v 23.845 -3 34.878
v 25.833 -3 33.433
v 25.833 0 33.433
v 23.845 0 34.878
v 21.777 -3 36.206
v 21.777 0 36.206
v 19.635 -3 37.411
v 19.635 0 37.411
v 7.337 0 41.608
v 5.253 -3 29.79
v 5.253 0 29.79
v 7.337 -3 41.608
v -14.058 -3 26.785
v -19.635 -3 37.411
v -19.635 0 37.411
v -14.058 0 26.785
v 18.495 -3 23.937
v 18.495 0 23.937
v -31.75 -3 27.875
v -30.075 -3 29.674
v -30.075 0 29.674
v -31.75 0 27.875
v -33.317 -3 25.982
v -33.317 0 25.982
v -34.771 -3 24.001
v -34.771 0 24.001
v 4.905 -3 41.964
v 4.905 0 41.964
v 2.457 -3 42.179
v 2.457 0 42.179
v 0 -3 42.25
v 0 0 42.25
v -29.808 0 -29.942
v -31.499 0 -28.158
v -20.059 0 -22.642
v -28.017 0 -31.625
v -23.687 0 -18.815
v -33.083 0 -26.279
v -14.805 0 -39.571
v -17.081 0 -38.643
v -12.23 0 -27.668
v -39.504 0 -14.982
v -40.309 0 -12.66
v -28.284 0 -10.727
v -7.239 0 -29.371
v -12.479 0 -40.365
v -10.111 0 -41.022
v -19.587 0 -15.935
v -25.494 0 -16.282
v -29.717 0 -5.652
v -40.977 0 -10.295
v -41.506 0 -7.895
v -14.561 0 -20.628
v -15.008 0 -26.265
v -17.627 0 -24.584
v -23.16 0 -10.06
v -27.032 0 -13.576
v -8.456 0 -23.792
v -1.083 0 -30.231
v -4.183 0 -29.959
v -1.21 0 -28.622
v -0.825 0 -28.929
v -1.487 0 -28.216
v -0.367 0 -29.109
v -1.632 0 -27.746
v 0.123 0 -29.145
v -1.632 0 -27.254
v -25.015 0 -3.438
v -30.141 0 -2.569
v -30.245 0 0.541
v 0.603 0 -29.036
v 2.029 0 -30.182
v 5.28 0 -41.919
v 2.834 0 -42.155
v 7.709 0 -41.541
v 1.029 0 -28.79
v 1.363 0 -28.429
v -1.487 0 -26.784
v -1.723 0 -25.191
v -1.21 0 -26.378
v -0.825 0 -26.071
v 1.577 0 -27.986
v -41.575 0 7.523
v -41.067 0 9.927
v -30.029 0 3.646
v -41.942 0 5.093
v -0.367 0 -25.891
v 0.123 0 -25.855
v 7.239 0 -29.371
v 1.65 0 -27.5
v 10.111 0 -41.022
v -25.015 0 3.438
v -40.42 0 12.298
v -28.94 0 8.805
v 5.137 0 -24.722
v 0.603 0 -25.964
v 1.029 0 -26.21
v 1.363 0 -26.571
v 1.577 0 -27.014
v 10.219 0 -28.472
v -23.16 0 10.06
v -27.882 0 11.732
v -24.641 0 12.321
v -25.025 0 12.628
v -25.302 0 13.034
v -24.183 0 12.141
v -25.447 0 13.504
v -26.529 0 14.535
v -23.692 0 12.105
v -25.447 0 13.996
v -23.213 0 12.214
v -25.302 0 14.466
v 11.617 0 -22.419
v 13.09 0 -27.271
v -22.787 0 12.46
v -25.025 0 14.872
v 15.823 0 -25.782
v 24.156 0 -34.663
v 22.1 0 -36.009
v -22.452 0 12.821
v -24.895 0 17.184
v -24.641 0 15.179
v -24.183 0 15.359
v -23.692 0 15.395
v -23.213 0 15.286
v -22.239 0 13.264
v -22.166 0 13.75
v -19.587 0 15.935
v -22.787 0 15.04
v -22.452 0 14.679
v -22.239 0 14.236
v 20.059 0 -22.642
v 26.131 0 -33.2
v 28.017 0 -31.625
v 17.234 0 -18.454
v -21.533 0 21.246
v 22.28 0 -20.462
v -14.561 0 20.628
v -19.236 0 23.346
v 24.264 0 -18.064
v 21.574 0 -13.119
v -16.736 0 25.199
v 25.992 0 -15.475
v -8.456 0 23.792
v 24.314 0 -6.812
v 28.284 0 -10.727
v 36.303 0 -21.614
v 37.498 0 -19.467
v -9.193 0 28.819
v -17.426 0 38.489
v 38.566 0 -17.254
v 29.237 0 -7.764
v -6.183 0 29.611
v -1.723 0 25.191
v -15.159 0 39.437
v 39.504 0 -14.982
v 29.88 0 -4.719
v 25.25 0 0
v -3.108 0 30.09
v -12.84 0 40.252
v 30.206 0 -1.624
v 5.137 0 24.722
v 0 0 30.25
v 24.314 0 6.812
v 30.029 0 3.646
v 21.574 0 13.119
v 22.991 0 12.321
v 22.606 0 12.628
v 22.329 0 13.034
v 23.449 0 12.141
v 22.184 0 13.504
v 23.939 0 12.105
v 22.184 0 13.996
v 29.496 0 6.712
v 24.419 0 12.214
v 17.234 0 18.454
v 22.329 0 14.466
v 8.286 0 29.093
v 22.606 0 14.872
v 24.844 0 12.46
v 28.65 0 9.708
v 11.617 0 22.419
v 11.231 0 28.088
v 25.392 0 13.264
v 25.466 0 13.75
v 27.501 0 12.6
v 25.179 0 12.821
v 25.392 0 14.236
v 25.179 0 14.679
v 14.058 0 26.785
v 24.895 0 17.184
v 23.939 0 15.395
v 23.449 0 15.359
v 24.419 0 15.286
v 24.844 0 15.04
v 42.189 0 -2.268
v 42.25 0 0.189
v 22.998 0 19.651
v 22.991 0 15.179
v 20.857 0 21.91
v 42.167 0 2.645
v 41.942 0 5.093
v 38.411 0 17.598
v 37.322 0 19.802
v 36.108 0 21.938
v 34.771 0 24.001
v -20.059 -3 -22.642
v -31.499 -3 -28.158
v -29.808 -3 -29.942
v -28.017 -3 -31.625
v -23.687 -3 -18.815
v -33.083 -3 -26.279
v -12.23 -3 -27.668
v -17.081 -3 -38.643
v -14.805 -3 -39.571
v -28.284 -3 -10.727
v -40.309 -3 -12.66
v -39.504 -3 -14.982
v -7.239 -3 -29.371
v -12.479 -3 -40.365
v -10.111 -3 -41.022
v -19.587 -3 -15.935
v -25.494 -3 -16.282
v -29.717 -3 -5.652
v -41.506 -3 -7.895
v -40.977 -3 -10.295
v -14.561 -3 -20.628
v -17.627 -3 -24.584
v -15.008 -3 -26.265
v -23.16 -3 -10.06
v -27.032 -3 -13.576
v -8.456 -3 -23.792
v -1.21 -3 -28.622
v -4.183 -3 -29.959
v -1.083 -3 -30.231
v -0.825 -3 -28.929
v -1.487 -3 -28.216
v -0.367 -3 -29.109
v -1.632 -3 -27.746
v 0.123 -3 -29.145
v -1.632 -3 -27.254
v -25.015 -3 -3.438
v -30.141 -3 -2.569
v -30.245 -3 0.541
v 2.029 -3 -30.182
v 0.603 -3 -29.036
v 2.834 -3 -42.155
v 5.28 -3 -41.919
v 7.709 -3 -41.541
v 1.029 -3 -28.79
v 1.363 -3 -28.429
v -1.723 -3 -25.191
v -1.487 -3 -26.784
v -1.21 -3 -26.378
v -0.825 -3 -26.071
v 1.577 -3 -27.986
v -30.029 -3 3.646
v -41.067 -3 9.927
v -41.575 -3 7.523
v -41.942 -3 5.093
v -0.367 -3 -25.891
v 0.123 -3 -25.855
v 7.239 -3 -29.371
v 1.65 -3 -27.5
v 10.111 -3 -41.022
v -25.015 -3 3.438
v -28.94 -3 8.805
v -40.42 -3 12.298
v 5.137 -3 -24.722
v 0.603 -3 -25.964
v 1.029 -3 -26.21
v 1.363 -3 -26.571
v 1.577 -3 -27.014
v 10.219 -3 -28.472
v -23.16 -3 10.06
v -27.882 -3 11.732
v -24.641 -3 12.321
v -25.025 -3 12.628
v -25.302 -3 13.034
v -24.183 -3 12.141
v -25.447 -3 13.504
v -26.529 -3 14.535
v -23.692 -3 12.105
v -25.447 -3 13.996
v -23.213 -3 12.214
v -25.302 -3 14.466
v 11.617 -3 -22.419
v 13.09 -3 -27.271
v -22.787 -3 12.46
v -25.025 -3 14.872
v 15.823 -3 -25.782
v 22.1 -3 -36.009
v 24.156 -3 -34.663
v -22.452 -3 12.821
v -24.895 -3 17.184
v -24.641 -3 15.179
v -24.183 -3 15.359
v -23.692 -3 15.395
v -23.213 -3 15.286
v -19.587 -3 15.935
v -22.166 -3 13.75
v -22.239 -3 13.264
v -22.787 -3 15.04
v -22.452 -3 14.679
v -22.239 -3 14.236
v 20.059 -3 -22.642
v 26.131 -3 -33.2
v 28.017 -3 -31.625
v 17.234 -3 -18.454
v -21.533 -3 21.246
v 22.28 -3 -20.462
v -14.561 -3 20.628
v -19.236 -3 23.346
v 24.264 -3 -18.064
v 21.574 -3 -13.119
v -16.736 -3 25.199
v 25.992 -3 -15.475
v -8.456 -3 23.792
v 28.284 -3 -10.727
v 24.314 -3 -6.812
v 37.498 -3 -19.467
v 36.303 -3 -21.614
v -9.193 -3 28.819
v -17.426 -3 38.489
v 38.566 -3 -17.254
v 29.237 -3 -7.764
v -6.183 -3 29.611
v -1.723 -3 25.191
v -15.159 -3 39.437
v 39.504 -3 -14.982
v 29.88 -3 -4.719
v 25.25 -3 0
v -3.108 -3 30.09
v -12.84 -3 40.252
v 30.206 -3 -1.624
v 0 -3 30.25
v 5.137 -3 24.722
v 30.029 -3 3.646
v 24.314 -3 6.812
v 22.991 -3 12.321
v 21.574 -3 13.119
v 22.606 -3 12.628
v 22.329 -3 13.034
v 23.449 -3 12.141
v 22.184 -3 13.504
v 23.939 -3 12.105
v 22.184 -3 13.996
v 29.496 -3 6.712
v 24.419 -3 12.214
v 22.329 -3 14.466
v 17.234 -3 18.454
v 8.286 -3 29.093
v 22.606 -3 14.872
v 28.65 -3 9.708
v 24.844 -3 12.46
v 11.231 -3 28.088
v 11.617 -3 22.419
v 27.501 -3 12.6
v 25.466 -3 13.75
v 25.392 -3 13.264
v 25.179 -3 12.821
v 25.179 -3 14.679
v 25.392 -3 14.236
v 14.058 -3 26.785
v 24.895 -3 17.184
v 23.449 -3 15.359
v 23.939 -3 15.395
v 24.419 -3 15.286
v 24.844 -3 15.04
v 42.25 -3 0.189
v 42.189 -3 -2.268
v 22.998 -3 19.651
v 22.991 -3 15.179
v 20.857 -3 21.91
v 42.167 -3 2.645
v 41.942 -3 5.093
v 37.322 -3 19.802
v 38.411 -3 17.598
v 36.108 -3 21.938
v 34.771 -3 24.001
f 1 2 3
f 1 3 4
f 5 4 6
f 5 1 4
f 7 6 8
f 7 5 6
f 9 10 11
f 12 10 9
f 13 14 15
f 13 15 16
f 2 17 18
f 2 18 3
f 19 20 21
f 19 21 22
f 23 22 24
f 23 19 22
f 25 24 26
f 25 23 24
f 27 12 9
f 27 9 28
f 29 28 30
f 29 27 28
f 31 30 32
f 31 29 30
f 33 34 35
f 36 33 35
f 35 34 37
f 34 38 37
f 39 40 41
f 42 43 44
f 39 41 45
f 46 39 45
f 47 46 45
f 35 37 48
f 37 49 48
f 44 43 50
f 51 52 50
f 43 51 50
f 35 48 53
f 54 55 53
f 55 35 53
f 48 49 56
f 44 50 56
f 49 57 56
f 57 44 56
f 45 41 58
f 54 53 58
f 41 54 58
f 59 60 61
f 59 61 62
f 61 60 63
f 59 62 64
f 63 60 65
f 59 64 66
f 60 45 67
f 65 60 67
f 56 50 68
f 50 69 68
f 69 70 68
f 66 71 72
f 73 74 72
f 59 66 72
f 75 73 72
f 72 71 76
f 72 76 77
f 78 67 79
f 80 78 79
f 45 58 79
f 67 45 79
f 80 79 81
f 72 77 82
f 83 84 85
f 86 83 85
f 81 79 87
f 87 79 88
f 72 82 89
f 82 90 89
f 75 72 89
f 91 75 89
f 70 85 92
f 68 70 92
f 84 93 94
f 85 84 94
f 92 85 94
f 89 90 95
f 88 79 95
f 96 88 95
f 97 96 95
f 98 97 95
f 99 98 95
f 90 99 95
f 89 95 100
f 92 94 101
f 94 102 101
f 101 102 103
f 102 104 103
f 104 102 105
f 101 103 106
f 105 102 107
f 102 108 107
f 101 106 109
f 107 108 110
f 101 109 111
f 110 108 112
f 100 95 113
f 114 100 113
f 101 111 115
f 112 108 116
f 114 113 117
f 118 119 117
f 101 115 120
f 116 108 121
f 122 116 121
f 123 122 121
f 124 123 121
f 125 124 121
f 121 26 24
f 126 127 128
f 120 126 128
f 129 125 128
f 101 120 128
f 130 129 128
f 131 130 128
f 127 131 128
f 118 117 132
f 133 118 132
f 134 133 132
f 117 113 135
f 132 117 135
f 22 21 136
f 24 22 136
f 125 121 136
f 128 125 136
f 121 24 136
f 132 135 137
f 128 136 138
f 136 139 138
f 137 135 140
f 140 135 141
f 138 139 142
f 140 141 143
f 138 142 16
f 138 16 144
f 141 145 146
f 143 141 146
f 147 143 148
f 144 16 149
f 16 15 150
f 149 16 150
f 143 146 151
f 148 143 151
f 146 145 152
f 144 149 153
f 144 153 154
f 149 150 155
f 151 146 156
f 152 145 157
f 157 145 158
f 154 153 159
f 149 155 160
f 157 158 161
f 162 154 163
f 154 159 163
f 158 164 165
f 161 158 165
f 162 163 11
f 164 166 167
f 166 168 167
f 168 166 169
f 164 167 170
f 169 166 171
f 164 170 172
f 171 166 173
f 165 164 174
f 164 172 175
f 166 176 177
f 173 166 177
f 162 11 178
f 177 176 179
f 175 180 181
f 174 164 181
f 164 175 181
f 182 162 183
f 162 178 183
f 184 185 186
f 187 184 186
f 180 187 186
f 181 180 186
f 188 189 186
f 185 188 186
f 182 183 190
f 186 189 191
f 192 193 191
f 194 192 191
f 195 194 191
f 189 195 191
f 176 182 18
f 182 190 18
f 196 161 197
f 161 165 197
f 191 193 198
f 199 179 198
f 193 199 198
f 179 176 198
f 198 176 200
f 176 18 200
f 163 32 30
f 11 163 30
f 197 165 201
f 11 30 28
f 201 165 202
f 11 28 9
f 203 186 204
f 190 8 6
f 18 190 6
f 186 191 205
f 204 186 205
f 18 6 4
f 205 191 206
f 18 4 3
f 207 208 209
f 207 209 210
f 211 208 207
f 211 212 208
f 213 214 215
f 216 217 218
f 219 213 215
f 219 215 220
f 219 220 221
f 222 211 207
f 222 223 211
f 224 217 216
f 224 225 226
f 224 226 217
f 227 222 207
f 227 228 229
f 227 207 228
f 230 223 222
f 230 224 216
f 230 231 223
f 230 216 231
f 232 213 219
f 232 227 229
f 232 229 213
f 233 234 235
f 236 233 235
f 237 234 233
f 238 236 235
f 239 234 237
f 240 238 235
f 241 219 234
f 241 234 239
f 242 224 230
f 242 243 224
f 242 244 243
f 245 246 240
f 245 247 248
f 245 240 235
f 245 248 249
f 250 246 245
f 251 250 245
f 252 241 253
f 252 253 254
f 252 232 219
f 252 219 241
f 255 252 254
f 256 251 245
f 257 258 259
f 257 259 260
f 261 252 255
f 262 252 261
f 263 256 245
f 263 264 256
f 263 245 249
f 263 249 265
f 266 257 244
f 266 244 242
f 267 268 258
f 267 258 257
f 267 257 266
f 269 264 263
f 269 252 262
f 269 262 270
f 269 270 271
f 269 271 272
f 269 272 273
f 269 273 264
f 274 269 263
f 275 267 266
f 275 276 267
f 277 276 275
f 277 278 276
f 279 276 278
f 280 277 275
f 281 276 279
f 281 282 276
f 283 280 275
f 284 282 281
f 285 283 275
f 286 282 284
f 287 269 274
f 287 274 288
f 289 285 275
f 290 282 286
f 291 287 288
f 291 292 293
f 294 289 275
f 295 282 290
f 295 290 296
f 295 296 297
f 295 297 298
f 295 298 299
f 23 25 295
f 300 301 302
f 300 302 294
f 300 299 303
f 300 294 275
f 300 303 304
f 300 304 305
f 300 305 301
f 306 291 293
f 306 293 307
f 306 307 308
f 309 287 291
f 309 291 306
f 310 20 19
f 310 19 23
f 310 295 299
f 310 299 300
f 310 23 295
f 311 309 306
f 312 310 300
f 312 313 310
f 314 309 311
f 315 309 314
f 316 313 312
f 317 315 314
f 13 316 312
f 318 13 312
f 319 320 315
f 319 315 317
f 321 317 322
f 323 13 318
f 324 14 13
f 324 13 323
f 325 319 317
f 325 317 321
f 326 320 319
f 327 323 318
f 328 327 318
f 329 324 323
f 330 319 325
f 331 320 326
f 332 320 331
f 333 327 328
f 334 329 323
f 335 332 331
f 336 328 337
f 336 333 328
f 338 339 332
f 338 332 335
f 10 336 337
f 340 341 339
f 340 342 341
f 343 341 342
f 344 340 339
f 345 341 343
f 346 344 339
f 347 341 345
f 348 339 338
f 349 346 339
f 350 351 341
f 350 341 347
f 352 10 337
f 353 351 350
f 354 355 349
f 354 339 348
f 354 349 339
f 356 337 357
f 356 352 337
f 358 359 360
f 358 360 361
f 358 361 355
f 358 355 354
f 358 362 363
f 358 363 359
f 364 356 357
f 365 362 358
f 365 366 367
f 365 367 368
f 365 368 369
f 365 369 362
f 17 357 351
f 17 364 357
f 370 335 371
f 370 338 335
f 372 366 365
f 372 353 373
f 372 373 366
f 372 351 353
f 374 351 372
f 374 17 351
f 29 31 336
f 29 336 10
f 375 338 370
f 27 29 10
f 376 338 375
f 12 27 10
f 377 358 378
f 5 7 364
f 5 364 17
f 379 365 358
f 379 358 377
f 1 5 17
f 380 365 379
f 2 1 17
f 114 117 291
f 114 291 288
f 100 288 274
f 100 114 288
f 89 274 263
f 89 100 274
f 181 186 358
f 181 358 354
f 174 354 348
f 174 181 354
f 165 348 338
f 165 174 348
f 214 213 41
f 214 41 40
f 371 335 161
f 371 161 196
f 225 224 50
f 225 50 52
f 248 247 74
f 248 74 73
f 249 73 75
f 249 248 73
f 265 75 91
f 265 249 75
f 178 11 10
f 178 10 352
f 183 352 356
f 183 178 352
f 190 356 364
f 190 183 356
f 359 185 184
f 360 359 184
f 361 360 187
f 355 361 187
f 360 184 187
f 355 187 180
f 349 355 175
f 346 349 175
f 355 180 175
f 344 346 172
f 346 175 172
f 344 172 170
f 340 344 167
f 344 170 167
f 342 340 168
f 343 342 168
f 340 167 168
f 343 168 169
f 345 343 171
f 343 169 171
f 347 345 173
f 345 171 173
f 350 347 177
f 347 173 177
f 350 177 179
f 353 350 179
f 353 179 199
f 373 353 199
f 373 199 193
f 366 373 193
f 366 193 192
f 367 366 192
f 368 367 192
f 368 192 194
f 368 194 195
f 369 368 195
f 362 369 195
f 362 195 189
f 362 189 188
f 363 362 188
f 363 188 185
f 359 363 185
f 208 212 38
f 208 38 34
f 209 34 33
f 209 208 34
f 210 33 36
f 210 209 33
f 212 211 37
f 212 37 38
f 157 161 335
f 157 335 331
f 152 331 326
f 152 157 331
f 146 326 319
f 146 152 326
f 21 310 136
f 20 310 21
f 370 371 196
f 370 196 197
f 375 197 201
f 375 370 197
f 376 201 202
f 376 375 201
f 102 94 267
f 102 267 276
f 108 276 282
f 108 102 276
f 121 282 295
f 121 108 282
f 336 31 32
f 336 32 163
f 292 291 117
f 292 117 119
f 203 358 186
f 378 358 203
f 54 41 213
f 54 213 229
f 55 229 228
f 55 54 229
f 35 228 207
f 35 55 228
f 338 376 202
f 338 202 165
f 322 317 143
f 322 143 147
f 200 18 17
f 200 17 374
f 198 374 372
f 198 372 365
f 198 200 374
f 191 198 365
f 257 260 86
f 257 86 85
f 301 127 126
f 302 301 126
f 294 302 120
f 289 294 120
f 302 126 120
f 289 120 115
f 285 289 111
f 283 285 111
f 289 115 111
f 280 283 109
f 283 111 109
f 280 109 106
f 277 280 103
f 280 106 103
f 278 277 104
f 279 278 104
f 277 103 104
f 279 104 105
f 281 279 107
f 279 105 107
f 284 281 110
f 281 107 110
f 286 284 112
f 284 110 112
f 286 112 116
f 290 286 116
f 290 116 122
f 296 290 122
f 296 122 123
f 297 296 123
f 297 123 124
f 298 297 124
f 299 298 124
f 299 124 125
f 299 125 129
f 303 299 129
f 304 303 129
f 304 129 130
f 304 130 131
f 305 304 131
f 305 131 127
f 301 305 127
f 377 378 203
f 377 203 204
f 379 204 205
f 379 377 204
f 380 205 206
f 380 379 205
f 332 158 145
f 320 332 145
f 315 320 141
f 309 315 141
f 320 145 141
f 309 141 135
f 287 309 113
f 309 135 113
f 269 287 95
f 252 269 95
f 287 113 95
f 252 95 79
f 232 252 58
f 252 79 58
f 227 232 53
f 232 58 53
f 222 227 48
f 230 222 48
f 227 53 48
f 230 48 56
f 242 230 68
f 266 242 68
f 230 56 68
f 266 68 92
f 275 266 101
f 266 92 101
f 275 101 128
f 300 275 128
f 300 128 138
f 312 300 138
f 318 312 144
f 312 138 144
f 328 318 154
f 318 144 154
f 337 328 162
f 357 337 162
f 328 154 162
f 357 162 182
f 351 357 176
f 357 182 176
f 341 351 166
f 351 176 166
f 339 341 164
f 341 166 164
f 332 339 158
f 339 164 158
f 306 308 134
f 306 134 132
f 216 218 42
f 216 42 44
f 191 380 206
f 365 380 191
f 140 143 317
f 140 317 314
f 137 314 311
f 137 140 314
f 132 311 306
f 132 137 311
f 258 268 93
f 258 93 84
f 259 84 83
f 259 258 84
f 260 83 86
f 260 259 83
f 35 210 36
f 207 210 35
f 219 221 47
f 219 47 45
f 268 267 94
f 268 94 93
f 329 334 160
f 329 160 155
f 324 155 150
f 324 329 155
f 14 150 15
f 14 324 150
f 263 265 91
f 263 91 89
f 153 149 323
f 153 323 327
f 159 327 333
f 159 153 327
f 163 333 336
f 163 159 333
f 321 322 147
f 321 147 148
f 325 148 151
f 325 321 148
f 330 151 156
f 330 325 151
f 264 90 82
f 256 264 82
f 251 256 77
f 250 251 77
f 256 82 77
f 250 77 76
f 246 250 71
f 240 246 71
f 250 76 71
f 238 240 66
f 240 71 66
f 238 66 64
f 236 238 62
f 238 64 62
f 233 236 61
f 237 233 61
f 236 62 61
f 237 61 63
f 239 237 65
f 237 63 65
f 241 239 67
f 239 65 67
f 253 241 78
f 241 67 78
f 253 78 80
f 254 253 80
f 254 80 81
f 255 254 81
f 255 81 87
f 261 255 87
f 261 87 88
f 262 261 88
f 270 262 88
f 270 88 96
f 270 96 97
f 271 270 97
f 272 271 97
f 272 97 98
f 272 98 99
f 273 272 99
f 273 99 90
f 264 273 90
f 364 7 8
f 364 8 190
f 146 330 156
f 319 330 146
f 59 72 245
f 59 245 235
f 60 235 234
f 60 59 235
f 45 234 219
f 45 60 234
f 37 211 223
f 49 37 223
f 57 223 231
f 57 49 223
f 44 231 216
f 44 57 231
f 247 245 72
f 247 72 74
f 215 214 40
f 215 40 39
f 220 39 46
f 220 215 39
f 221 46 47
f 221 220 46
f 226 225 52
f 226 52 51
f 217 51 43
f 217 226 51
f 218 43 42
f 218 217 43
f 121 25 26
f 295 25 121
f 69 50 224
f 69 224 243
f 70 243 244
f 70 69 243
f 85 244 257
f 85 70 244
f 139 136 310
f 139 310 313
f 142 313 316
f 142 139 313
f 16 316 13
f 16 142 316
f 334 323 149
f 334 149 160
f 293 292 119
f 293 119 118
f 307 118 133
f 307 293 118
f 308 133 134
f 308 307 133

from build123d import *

# Parameters (mm, degrees)
SKETCH1_R           = 30.25
SKETCH1_R_2         = 25.25
EXTRUDE_THIN1_DEPTH = 3
SKETCH2_R           = 1.65
CUT_EXTRUDE3_DEPTH  = 10
BOSS_EXTRUDE1_DEPTH = 3


with BuildPart() as part:
    # Sketch1 → Extrude-Thin1 (new body)
    with BuildSketch(Plane(origin=(0, 0, 0), x_dir=(1, 0, 0), z_dir=(0, 1, 0))):
        Circle(SKETCH1_R)
        Circle(SKETCH1_R_2, mode=Mode.SUBTRACT)
    extrude(amount=-EXTRUDE_THIN1_DEPTH)

    # Sketch2 → Cut-Extrude3 (cut)
    with BuildSketch(Plane(origin=(0, 0, 0), x_dir=(1, 0, 0), z_dir=(0, 1, 0))):
        with Locations((0, 27.5)):
            Circle(SKETCH2_R)
        with Locations((23.815698604, -13.75)):
            Circle(SKETCH2_R)
        with Locations((-23.815698604, -13.75)):
            Circle(SKETCH2_R)
    extrude(amount=-CUT_EXTRUDE3_DEPTH, mode=Mode.SUBTRACT)

    # Sketch5 → Boss-Extrude1 (add)
    with BuildSketch(Plane.XZ.offset(3)):
        with BuildLine():
            Line((0, 42.25), (0, 30.25))
            ThreePointArc((0, 30.25), (2.636461218, 30.134889617), (5.252857374, 29.790434529))
            Line((5.252857374, 29.790434529), (7.336635506, 41.608127565))
            ThreePointArc((7.336635506, 41.608127565), (3.682330131, 42.089225994), (0, 42.25))
        make_face()
        with BuildLine():
            Line((19.634554019, 37.410517084), (14.057875954, 26.785044776))
            ThreePointArc((14.057875954, 26.785044776), (16.338851964, 25.457894974), (18.495479445, 23.936995219))
            Line((18.495479445, 23.936995219), (25.832529142, 33.432662744))
            ThreePointArc((25.832529142, 33.432662744), (22.820380016, 35.556894633), (19.634554019, 37.410517084))
        make_face()
        with BuildLine():
            Line((34.771068334, 24.000735549), (24.895261943, 17.183958589))
            ThreePointArc((24.895261943, 17.183958589), (26.29820863, 14.948803393), (27.501010069, 12.599878777))
            Line((27.501010069, 12.599878777), (38.410501667, 17.598177795))
            ThreePointArc((38.410501667, 17.598177795), (36.730555855, 20.878907218), (34.771068334, 24.000735549))
        make_face()
        with BuildLine():
            Line((41.941949931, 5.092674741), (30.029443441, 3.646234578))
            ThreePointArc((30.029443441, 3.646234578), (30.232962626, 1.015121107), (30.20639071, -1.623718049))
            Line((30.20639071, -1.623718049), (42.189091156, -2.267837605))
            ThreePointArc((42.189091156, -2.267837605), (42.226203998, 1.417813777), (41.941949931, 5.092674741))
        make_face()
        with BuildLine():
            Line((39.504436253, -14.982056478), (28.284241341, -10.726797833))
            ThreePointArc((28.284241341, -10.726797833), (27.241709231, -13.151113191), (25.991851265, -15.475340637))
            Line((25.991851265, -15.475340637), (36.302668296, -21.61431874))
            ThreePointArc((36.302668296, -21.61431874), (38.048337687, -18.368083713), (39.504436253, -14.982056478))
        make_face()
        with BuildLine():
            Line((28.016932311, -31.62457911), (20.059460412, -22.642450132))
            ThreePointArc((20.059460412, -22.642450132), (18.00970855, -24.304585945), (15.822891931, -25.781749183))
            Line((15.822891931, -25.781749183), (22.099741623, -36.009219933))
            ThreePointArc((22.099741623, -36.009219933), (25.154055743, -33.946074584), (28.016932311, -31.62457911))
        make_face()
        with BuildLine():
            Line((10.111086816, -41.022291786), (7.239298845, -29.370989977))
            ThreePointArc((7.239298845, -29.370989977), (4.65190068, -29.890170961), (2.029098743, -30.181869695))
            Line((2.029098743, -30.181869695), (2.834030476, -42.154842797))
            ThreePointArc((2.834030476, -42.154842797), (6.497282768, -41.747428862), (10.111086816, -41.022291786))
        make_face()
        with BuildLine():
            Line((-10.111086816, -41.022291786), (-7.239298845, -29.370989977))
            ThreePointArc((-7.239298845, -29.370989977), (-9.771601574, -28.628278025), (-12.229536514, -27.667687591))
            Line((-12.229536514, -27.667687591), (-17.0809229, -38.643299198))
            ThreePointArc((-17.0809229, -38.643299198), (-13.647939388, -39.9849503), (-10.111086816, -41.022291786))
        make_face()
        with BuildLine():
            Line((-28.016932311, -31.62457911), (-20.059460412, -22.642450132))
            ThreePointArc((-20.059460412, -22.642450132), (-21.956547668, -20.807991602), (-23.686532338, -18.815171692))
            Line((-23.686532338, -18.815171692), (-33.082842687, -26.279041454))
            ThreePointArc((-33.082842687, -26.279041454), (-30.666583106, -29.062401494), (-28.016932311, -31.62457911))
        make_face()
        with BuildLine():
            Line((-39.504436253, -14.982056478), (-28.284241341, -10.726797833))
            ThreePointArc((-28.284241341, -10.726797833), (-29.111513296, -8.220845067), (-29.717229057, -5.652326705))
            Line((-29.717229057, -5.652326705), (-41.505881906, -7.89457201))
            ThreePointArc((-41.505881906, -7.89457201), (-40.659882207, -11.482006746), (-39.504436253, -14.982056478))
        make_face()
        with BuildLine():
            Line((-41.941949931, 5.092674741), (-30.029443441, 3.646234578))
            ThreePointArc((-30.029443441, 3.646234578), (-29.59738206, 6.249598002), (-28.94006673, 8.805398211))
            Line((-28.94006673, 8.805398211), (-40.42042378, 12.298448742))
            ThreePointArc((-40.42042378, 12.298448742), (-41.338492299, 8.728777374), (-41.941949931, 5.092674741))
        make_face()
        with BuildLine():
            Line((-34.771068334, 24.000735549), (-24.895261943, 17.183958589))
            ThreePointArc((-24.895261943, 17.183958589), (-23.302847281, 19.288333484), (-21.533083881, 21.245912515))
            Line((-21.533083881, 21.245912515), (-30.075133685, 29.674043099))
            ThreePointArc((-30.075133685, 29.674043099), (-32.546951988, 26.939903791), (-34.771068334, 24.000735549))
        make_face()
        with BuildLine():
            Line((-19.634554019, 37.410517084), (-14.057875954, 26.785044776))
            ThreePointArc((-14.057875954, 26.785044776), (-11.66991102, 27.908344214), (-9.193131017, 28.819244302))
            Line((-9.193131017, 28.819244302), (-12.839992908, 40.251671793))
            ThreePointArc((-12.839992908, 40.251671793), (-16.29929721, 38.979422911), (-19.634554019, 37.410517084))
        make_face()
    extrude(amount=-BOSS_EXTRUDE1_DEPTH)


solid = part.part
